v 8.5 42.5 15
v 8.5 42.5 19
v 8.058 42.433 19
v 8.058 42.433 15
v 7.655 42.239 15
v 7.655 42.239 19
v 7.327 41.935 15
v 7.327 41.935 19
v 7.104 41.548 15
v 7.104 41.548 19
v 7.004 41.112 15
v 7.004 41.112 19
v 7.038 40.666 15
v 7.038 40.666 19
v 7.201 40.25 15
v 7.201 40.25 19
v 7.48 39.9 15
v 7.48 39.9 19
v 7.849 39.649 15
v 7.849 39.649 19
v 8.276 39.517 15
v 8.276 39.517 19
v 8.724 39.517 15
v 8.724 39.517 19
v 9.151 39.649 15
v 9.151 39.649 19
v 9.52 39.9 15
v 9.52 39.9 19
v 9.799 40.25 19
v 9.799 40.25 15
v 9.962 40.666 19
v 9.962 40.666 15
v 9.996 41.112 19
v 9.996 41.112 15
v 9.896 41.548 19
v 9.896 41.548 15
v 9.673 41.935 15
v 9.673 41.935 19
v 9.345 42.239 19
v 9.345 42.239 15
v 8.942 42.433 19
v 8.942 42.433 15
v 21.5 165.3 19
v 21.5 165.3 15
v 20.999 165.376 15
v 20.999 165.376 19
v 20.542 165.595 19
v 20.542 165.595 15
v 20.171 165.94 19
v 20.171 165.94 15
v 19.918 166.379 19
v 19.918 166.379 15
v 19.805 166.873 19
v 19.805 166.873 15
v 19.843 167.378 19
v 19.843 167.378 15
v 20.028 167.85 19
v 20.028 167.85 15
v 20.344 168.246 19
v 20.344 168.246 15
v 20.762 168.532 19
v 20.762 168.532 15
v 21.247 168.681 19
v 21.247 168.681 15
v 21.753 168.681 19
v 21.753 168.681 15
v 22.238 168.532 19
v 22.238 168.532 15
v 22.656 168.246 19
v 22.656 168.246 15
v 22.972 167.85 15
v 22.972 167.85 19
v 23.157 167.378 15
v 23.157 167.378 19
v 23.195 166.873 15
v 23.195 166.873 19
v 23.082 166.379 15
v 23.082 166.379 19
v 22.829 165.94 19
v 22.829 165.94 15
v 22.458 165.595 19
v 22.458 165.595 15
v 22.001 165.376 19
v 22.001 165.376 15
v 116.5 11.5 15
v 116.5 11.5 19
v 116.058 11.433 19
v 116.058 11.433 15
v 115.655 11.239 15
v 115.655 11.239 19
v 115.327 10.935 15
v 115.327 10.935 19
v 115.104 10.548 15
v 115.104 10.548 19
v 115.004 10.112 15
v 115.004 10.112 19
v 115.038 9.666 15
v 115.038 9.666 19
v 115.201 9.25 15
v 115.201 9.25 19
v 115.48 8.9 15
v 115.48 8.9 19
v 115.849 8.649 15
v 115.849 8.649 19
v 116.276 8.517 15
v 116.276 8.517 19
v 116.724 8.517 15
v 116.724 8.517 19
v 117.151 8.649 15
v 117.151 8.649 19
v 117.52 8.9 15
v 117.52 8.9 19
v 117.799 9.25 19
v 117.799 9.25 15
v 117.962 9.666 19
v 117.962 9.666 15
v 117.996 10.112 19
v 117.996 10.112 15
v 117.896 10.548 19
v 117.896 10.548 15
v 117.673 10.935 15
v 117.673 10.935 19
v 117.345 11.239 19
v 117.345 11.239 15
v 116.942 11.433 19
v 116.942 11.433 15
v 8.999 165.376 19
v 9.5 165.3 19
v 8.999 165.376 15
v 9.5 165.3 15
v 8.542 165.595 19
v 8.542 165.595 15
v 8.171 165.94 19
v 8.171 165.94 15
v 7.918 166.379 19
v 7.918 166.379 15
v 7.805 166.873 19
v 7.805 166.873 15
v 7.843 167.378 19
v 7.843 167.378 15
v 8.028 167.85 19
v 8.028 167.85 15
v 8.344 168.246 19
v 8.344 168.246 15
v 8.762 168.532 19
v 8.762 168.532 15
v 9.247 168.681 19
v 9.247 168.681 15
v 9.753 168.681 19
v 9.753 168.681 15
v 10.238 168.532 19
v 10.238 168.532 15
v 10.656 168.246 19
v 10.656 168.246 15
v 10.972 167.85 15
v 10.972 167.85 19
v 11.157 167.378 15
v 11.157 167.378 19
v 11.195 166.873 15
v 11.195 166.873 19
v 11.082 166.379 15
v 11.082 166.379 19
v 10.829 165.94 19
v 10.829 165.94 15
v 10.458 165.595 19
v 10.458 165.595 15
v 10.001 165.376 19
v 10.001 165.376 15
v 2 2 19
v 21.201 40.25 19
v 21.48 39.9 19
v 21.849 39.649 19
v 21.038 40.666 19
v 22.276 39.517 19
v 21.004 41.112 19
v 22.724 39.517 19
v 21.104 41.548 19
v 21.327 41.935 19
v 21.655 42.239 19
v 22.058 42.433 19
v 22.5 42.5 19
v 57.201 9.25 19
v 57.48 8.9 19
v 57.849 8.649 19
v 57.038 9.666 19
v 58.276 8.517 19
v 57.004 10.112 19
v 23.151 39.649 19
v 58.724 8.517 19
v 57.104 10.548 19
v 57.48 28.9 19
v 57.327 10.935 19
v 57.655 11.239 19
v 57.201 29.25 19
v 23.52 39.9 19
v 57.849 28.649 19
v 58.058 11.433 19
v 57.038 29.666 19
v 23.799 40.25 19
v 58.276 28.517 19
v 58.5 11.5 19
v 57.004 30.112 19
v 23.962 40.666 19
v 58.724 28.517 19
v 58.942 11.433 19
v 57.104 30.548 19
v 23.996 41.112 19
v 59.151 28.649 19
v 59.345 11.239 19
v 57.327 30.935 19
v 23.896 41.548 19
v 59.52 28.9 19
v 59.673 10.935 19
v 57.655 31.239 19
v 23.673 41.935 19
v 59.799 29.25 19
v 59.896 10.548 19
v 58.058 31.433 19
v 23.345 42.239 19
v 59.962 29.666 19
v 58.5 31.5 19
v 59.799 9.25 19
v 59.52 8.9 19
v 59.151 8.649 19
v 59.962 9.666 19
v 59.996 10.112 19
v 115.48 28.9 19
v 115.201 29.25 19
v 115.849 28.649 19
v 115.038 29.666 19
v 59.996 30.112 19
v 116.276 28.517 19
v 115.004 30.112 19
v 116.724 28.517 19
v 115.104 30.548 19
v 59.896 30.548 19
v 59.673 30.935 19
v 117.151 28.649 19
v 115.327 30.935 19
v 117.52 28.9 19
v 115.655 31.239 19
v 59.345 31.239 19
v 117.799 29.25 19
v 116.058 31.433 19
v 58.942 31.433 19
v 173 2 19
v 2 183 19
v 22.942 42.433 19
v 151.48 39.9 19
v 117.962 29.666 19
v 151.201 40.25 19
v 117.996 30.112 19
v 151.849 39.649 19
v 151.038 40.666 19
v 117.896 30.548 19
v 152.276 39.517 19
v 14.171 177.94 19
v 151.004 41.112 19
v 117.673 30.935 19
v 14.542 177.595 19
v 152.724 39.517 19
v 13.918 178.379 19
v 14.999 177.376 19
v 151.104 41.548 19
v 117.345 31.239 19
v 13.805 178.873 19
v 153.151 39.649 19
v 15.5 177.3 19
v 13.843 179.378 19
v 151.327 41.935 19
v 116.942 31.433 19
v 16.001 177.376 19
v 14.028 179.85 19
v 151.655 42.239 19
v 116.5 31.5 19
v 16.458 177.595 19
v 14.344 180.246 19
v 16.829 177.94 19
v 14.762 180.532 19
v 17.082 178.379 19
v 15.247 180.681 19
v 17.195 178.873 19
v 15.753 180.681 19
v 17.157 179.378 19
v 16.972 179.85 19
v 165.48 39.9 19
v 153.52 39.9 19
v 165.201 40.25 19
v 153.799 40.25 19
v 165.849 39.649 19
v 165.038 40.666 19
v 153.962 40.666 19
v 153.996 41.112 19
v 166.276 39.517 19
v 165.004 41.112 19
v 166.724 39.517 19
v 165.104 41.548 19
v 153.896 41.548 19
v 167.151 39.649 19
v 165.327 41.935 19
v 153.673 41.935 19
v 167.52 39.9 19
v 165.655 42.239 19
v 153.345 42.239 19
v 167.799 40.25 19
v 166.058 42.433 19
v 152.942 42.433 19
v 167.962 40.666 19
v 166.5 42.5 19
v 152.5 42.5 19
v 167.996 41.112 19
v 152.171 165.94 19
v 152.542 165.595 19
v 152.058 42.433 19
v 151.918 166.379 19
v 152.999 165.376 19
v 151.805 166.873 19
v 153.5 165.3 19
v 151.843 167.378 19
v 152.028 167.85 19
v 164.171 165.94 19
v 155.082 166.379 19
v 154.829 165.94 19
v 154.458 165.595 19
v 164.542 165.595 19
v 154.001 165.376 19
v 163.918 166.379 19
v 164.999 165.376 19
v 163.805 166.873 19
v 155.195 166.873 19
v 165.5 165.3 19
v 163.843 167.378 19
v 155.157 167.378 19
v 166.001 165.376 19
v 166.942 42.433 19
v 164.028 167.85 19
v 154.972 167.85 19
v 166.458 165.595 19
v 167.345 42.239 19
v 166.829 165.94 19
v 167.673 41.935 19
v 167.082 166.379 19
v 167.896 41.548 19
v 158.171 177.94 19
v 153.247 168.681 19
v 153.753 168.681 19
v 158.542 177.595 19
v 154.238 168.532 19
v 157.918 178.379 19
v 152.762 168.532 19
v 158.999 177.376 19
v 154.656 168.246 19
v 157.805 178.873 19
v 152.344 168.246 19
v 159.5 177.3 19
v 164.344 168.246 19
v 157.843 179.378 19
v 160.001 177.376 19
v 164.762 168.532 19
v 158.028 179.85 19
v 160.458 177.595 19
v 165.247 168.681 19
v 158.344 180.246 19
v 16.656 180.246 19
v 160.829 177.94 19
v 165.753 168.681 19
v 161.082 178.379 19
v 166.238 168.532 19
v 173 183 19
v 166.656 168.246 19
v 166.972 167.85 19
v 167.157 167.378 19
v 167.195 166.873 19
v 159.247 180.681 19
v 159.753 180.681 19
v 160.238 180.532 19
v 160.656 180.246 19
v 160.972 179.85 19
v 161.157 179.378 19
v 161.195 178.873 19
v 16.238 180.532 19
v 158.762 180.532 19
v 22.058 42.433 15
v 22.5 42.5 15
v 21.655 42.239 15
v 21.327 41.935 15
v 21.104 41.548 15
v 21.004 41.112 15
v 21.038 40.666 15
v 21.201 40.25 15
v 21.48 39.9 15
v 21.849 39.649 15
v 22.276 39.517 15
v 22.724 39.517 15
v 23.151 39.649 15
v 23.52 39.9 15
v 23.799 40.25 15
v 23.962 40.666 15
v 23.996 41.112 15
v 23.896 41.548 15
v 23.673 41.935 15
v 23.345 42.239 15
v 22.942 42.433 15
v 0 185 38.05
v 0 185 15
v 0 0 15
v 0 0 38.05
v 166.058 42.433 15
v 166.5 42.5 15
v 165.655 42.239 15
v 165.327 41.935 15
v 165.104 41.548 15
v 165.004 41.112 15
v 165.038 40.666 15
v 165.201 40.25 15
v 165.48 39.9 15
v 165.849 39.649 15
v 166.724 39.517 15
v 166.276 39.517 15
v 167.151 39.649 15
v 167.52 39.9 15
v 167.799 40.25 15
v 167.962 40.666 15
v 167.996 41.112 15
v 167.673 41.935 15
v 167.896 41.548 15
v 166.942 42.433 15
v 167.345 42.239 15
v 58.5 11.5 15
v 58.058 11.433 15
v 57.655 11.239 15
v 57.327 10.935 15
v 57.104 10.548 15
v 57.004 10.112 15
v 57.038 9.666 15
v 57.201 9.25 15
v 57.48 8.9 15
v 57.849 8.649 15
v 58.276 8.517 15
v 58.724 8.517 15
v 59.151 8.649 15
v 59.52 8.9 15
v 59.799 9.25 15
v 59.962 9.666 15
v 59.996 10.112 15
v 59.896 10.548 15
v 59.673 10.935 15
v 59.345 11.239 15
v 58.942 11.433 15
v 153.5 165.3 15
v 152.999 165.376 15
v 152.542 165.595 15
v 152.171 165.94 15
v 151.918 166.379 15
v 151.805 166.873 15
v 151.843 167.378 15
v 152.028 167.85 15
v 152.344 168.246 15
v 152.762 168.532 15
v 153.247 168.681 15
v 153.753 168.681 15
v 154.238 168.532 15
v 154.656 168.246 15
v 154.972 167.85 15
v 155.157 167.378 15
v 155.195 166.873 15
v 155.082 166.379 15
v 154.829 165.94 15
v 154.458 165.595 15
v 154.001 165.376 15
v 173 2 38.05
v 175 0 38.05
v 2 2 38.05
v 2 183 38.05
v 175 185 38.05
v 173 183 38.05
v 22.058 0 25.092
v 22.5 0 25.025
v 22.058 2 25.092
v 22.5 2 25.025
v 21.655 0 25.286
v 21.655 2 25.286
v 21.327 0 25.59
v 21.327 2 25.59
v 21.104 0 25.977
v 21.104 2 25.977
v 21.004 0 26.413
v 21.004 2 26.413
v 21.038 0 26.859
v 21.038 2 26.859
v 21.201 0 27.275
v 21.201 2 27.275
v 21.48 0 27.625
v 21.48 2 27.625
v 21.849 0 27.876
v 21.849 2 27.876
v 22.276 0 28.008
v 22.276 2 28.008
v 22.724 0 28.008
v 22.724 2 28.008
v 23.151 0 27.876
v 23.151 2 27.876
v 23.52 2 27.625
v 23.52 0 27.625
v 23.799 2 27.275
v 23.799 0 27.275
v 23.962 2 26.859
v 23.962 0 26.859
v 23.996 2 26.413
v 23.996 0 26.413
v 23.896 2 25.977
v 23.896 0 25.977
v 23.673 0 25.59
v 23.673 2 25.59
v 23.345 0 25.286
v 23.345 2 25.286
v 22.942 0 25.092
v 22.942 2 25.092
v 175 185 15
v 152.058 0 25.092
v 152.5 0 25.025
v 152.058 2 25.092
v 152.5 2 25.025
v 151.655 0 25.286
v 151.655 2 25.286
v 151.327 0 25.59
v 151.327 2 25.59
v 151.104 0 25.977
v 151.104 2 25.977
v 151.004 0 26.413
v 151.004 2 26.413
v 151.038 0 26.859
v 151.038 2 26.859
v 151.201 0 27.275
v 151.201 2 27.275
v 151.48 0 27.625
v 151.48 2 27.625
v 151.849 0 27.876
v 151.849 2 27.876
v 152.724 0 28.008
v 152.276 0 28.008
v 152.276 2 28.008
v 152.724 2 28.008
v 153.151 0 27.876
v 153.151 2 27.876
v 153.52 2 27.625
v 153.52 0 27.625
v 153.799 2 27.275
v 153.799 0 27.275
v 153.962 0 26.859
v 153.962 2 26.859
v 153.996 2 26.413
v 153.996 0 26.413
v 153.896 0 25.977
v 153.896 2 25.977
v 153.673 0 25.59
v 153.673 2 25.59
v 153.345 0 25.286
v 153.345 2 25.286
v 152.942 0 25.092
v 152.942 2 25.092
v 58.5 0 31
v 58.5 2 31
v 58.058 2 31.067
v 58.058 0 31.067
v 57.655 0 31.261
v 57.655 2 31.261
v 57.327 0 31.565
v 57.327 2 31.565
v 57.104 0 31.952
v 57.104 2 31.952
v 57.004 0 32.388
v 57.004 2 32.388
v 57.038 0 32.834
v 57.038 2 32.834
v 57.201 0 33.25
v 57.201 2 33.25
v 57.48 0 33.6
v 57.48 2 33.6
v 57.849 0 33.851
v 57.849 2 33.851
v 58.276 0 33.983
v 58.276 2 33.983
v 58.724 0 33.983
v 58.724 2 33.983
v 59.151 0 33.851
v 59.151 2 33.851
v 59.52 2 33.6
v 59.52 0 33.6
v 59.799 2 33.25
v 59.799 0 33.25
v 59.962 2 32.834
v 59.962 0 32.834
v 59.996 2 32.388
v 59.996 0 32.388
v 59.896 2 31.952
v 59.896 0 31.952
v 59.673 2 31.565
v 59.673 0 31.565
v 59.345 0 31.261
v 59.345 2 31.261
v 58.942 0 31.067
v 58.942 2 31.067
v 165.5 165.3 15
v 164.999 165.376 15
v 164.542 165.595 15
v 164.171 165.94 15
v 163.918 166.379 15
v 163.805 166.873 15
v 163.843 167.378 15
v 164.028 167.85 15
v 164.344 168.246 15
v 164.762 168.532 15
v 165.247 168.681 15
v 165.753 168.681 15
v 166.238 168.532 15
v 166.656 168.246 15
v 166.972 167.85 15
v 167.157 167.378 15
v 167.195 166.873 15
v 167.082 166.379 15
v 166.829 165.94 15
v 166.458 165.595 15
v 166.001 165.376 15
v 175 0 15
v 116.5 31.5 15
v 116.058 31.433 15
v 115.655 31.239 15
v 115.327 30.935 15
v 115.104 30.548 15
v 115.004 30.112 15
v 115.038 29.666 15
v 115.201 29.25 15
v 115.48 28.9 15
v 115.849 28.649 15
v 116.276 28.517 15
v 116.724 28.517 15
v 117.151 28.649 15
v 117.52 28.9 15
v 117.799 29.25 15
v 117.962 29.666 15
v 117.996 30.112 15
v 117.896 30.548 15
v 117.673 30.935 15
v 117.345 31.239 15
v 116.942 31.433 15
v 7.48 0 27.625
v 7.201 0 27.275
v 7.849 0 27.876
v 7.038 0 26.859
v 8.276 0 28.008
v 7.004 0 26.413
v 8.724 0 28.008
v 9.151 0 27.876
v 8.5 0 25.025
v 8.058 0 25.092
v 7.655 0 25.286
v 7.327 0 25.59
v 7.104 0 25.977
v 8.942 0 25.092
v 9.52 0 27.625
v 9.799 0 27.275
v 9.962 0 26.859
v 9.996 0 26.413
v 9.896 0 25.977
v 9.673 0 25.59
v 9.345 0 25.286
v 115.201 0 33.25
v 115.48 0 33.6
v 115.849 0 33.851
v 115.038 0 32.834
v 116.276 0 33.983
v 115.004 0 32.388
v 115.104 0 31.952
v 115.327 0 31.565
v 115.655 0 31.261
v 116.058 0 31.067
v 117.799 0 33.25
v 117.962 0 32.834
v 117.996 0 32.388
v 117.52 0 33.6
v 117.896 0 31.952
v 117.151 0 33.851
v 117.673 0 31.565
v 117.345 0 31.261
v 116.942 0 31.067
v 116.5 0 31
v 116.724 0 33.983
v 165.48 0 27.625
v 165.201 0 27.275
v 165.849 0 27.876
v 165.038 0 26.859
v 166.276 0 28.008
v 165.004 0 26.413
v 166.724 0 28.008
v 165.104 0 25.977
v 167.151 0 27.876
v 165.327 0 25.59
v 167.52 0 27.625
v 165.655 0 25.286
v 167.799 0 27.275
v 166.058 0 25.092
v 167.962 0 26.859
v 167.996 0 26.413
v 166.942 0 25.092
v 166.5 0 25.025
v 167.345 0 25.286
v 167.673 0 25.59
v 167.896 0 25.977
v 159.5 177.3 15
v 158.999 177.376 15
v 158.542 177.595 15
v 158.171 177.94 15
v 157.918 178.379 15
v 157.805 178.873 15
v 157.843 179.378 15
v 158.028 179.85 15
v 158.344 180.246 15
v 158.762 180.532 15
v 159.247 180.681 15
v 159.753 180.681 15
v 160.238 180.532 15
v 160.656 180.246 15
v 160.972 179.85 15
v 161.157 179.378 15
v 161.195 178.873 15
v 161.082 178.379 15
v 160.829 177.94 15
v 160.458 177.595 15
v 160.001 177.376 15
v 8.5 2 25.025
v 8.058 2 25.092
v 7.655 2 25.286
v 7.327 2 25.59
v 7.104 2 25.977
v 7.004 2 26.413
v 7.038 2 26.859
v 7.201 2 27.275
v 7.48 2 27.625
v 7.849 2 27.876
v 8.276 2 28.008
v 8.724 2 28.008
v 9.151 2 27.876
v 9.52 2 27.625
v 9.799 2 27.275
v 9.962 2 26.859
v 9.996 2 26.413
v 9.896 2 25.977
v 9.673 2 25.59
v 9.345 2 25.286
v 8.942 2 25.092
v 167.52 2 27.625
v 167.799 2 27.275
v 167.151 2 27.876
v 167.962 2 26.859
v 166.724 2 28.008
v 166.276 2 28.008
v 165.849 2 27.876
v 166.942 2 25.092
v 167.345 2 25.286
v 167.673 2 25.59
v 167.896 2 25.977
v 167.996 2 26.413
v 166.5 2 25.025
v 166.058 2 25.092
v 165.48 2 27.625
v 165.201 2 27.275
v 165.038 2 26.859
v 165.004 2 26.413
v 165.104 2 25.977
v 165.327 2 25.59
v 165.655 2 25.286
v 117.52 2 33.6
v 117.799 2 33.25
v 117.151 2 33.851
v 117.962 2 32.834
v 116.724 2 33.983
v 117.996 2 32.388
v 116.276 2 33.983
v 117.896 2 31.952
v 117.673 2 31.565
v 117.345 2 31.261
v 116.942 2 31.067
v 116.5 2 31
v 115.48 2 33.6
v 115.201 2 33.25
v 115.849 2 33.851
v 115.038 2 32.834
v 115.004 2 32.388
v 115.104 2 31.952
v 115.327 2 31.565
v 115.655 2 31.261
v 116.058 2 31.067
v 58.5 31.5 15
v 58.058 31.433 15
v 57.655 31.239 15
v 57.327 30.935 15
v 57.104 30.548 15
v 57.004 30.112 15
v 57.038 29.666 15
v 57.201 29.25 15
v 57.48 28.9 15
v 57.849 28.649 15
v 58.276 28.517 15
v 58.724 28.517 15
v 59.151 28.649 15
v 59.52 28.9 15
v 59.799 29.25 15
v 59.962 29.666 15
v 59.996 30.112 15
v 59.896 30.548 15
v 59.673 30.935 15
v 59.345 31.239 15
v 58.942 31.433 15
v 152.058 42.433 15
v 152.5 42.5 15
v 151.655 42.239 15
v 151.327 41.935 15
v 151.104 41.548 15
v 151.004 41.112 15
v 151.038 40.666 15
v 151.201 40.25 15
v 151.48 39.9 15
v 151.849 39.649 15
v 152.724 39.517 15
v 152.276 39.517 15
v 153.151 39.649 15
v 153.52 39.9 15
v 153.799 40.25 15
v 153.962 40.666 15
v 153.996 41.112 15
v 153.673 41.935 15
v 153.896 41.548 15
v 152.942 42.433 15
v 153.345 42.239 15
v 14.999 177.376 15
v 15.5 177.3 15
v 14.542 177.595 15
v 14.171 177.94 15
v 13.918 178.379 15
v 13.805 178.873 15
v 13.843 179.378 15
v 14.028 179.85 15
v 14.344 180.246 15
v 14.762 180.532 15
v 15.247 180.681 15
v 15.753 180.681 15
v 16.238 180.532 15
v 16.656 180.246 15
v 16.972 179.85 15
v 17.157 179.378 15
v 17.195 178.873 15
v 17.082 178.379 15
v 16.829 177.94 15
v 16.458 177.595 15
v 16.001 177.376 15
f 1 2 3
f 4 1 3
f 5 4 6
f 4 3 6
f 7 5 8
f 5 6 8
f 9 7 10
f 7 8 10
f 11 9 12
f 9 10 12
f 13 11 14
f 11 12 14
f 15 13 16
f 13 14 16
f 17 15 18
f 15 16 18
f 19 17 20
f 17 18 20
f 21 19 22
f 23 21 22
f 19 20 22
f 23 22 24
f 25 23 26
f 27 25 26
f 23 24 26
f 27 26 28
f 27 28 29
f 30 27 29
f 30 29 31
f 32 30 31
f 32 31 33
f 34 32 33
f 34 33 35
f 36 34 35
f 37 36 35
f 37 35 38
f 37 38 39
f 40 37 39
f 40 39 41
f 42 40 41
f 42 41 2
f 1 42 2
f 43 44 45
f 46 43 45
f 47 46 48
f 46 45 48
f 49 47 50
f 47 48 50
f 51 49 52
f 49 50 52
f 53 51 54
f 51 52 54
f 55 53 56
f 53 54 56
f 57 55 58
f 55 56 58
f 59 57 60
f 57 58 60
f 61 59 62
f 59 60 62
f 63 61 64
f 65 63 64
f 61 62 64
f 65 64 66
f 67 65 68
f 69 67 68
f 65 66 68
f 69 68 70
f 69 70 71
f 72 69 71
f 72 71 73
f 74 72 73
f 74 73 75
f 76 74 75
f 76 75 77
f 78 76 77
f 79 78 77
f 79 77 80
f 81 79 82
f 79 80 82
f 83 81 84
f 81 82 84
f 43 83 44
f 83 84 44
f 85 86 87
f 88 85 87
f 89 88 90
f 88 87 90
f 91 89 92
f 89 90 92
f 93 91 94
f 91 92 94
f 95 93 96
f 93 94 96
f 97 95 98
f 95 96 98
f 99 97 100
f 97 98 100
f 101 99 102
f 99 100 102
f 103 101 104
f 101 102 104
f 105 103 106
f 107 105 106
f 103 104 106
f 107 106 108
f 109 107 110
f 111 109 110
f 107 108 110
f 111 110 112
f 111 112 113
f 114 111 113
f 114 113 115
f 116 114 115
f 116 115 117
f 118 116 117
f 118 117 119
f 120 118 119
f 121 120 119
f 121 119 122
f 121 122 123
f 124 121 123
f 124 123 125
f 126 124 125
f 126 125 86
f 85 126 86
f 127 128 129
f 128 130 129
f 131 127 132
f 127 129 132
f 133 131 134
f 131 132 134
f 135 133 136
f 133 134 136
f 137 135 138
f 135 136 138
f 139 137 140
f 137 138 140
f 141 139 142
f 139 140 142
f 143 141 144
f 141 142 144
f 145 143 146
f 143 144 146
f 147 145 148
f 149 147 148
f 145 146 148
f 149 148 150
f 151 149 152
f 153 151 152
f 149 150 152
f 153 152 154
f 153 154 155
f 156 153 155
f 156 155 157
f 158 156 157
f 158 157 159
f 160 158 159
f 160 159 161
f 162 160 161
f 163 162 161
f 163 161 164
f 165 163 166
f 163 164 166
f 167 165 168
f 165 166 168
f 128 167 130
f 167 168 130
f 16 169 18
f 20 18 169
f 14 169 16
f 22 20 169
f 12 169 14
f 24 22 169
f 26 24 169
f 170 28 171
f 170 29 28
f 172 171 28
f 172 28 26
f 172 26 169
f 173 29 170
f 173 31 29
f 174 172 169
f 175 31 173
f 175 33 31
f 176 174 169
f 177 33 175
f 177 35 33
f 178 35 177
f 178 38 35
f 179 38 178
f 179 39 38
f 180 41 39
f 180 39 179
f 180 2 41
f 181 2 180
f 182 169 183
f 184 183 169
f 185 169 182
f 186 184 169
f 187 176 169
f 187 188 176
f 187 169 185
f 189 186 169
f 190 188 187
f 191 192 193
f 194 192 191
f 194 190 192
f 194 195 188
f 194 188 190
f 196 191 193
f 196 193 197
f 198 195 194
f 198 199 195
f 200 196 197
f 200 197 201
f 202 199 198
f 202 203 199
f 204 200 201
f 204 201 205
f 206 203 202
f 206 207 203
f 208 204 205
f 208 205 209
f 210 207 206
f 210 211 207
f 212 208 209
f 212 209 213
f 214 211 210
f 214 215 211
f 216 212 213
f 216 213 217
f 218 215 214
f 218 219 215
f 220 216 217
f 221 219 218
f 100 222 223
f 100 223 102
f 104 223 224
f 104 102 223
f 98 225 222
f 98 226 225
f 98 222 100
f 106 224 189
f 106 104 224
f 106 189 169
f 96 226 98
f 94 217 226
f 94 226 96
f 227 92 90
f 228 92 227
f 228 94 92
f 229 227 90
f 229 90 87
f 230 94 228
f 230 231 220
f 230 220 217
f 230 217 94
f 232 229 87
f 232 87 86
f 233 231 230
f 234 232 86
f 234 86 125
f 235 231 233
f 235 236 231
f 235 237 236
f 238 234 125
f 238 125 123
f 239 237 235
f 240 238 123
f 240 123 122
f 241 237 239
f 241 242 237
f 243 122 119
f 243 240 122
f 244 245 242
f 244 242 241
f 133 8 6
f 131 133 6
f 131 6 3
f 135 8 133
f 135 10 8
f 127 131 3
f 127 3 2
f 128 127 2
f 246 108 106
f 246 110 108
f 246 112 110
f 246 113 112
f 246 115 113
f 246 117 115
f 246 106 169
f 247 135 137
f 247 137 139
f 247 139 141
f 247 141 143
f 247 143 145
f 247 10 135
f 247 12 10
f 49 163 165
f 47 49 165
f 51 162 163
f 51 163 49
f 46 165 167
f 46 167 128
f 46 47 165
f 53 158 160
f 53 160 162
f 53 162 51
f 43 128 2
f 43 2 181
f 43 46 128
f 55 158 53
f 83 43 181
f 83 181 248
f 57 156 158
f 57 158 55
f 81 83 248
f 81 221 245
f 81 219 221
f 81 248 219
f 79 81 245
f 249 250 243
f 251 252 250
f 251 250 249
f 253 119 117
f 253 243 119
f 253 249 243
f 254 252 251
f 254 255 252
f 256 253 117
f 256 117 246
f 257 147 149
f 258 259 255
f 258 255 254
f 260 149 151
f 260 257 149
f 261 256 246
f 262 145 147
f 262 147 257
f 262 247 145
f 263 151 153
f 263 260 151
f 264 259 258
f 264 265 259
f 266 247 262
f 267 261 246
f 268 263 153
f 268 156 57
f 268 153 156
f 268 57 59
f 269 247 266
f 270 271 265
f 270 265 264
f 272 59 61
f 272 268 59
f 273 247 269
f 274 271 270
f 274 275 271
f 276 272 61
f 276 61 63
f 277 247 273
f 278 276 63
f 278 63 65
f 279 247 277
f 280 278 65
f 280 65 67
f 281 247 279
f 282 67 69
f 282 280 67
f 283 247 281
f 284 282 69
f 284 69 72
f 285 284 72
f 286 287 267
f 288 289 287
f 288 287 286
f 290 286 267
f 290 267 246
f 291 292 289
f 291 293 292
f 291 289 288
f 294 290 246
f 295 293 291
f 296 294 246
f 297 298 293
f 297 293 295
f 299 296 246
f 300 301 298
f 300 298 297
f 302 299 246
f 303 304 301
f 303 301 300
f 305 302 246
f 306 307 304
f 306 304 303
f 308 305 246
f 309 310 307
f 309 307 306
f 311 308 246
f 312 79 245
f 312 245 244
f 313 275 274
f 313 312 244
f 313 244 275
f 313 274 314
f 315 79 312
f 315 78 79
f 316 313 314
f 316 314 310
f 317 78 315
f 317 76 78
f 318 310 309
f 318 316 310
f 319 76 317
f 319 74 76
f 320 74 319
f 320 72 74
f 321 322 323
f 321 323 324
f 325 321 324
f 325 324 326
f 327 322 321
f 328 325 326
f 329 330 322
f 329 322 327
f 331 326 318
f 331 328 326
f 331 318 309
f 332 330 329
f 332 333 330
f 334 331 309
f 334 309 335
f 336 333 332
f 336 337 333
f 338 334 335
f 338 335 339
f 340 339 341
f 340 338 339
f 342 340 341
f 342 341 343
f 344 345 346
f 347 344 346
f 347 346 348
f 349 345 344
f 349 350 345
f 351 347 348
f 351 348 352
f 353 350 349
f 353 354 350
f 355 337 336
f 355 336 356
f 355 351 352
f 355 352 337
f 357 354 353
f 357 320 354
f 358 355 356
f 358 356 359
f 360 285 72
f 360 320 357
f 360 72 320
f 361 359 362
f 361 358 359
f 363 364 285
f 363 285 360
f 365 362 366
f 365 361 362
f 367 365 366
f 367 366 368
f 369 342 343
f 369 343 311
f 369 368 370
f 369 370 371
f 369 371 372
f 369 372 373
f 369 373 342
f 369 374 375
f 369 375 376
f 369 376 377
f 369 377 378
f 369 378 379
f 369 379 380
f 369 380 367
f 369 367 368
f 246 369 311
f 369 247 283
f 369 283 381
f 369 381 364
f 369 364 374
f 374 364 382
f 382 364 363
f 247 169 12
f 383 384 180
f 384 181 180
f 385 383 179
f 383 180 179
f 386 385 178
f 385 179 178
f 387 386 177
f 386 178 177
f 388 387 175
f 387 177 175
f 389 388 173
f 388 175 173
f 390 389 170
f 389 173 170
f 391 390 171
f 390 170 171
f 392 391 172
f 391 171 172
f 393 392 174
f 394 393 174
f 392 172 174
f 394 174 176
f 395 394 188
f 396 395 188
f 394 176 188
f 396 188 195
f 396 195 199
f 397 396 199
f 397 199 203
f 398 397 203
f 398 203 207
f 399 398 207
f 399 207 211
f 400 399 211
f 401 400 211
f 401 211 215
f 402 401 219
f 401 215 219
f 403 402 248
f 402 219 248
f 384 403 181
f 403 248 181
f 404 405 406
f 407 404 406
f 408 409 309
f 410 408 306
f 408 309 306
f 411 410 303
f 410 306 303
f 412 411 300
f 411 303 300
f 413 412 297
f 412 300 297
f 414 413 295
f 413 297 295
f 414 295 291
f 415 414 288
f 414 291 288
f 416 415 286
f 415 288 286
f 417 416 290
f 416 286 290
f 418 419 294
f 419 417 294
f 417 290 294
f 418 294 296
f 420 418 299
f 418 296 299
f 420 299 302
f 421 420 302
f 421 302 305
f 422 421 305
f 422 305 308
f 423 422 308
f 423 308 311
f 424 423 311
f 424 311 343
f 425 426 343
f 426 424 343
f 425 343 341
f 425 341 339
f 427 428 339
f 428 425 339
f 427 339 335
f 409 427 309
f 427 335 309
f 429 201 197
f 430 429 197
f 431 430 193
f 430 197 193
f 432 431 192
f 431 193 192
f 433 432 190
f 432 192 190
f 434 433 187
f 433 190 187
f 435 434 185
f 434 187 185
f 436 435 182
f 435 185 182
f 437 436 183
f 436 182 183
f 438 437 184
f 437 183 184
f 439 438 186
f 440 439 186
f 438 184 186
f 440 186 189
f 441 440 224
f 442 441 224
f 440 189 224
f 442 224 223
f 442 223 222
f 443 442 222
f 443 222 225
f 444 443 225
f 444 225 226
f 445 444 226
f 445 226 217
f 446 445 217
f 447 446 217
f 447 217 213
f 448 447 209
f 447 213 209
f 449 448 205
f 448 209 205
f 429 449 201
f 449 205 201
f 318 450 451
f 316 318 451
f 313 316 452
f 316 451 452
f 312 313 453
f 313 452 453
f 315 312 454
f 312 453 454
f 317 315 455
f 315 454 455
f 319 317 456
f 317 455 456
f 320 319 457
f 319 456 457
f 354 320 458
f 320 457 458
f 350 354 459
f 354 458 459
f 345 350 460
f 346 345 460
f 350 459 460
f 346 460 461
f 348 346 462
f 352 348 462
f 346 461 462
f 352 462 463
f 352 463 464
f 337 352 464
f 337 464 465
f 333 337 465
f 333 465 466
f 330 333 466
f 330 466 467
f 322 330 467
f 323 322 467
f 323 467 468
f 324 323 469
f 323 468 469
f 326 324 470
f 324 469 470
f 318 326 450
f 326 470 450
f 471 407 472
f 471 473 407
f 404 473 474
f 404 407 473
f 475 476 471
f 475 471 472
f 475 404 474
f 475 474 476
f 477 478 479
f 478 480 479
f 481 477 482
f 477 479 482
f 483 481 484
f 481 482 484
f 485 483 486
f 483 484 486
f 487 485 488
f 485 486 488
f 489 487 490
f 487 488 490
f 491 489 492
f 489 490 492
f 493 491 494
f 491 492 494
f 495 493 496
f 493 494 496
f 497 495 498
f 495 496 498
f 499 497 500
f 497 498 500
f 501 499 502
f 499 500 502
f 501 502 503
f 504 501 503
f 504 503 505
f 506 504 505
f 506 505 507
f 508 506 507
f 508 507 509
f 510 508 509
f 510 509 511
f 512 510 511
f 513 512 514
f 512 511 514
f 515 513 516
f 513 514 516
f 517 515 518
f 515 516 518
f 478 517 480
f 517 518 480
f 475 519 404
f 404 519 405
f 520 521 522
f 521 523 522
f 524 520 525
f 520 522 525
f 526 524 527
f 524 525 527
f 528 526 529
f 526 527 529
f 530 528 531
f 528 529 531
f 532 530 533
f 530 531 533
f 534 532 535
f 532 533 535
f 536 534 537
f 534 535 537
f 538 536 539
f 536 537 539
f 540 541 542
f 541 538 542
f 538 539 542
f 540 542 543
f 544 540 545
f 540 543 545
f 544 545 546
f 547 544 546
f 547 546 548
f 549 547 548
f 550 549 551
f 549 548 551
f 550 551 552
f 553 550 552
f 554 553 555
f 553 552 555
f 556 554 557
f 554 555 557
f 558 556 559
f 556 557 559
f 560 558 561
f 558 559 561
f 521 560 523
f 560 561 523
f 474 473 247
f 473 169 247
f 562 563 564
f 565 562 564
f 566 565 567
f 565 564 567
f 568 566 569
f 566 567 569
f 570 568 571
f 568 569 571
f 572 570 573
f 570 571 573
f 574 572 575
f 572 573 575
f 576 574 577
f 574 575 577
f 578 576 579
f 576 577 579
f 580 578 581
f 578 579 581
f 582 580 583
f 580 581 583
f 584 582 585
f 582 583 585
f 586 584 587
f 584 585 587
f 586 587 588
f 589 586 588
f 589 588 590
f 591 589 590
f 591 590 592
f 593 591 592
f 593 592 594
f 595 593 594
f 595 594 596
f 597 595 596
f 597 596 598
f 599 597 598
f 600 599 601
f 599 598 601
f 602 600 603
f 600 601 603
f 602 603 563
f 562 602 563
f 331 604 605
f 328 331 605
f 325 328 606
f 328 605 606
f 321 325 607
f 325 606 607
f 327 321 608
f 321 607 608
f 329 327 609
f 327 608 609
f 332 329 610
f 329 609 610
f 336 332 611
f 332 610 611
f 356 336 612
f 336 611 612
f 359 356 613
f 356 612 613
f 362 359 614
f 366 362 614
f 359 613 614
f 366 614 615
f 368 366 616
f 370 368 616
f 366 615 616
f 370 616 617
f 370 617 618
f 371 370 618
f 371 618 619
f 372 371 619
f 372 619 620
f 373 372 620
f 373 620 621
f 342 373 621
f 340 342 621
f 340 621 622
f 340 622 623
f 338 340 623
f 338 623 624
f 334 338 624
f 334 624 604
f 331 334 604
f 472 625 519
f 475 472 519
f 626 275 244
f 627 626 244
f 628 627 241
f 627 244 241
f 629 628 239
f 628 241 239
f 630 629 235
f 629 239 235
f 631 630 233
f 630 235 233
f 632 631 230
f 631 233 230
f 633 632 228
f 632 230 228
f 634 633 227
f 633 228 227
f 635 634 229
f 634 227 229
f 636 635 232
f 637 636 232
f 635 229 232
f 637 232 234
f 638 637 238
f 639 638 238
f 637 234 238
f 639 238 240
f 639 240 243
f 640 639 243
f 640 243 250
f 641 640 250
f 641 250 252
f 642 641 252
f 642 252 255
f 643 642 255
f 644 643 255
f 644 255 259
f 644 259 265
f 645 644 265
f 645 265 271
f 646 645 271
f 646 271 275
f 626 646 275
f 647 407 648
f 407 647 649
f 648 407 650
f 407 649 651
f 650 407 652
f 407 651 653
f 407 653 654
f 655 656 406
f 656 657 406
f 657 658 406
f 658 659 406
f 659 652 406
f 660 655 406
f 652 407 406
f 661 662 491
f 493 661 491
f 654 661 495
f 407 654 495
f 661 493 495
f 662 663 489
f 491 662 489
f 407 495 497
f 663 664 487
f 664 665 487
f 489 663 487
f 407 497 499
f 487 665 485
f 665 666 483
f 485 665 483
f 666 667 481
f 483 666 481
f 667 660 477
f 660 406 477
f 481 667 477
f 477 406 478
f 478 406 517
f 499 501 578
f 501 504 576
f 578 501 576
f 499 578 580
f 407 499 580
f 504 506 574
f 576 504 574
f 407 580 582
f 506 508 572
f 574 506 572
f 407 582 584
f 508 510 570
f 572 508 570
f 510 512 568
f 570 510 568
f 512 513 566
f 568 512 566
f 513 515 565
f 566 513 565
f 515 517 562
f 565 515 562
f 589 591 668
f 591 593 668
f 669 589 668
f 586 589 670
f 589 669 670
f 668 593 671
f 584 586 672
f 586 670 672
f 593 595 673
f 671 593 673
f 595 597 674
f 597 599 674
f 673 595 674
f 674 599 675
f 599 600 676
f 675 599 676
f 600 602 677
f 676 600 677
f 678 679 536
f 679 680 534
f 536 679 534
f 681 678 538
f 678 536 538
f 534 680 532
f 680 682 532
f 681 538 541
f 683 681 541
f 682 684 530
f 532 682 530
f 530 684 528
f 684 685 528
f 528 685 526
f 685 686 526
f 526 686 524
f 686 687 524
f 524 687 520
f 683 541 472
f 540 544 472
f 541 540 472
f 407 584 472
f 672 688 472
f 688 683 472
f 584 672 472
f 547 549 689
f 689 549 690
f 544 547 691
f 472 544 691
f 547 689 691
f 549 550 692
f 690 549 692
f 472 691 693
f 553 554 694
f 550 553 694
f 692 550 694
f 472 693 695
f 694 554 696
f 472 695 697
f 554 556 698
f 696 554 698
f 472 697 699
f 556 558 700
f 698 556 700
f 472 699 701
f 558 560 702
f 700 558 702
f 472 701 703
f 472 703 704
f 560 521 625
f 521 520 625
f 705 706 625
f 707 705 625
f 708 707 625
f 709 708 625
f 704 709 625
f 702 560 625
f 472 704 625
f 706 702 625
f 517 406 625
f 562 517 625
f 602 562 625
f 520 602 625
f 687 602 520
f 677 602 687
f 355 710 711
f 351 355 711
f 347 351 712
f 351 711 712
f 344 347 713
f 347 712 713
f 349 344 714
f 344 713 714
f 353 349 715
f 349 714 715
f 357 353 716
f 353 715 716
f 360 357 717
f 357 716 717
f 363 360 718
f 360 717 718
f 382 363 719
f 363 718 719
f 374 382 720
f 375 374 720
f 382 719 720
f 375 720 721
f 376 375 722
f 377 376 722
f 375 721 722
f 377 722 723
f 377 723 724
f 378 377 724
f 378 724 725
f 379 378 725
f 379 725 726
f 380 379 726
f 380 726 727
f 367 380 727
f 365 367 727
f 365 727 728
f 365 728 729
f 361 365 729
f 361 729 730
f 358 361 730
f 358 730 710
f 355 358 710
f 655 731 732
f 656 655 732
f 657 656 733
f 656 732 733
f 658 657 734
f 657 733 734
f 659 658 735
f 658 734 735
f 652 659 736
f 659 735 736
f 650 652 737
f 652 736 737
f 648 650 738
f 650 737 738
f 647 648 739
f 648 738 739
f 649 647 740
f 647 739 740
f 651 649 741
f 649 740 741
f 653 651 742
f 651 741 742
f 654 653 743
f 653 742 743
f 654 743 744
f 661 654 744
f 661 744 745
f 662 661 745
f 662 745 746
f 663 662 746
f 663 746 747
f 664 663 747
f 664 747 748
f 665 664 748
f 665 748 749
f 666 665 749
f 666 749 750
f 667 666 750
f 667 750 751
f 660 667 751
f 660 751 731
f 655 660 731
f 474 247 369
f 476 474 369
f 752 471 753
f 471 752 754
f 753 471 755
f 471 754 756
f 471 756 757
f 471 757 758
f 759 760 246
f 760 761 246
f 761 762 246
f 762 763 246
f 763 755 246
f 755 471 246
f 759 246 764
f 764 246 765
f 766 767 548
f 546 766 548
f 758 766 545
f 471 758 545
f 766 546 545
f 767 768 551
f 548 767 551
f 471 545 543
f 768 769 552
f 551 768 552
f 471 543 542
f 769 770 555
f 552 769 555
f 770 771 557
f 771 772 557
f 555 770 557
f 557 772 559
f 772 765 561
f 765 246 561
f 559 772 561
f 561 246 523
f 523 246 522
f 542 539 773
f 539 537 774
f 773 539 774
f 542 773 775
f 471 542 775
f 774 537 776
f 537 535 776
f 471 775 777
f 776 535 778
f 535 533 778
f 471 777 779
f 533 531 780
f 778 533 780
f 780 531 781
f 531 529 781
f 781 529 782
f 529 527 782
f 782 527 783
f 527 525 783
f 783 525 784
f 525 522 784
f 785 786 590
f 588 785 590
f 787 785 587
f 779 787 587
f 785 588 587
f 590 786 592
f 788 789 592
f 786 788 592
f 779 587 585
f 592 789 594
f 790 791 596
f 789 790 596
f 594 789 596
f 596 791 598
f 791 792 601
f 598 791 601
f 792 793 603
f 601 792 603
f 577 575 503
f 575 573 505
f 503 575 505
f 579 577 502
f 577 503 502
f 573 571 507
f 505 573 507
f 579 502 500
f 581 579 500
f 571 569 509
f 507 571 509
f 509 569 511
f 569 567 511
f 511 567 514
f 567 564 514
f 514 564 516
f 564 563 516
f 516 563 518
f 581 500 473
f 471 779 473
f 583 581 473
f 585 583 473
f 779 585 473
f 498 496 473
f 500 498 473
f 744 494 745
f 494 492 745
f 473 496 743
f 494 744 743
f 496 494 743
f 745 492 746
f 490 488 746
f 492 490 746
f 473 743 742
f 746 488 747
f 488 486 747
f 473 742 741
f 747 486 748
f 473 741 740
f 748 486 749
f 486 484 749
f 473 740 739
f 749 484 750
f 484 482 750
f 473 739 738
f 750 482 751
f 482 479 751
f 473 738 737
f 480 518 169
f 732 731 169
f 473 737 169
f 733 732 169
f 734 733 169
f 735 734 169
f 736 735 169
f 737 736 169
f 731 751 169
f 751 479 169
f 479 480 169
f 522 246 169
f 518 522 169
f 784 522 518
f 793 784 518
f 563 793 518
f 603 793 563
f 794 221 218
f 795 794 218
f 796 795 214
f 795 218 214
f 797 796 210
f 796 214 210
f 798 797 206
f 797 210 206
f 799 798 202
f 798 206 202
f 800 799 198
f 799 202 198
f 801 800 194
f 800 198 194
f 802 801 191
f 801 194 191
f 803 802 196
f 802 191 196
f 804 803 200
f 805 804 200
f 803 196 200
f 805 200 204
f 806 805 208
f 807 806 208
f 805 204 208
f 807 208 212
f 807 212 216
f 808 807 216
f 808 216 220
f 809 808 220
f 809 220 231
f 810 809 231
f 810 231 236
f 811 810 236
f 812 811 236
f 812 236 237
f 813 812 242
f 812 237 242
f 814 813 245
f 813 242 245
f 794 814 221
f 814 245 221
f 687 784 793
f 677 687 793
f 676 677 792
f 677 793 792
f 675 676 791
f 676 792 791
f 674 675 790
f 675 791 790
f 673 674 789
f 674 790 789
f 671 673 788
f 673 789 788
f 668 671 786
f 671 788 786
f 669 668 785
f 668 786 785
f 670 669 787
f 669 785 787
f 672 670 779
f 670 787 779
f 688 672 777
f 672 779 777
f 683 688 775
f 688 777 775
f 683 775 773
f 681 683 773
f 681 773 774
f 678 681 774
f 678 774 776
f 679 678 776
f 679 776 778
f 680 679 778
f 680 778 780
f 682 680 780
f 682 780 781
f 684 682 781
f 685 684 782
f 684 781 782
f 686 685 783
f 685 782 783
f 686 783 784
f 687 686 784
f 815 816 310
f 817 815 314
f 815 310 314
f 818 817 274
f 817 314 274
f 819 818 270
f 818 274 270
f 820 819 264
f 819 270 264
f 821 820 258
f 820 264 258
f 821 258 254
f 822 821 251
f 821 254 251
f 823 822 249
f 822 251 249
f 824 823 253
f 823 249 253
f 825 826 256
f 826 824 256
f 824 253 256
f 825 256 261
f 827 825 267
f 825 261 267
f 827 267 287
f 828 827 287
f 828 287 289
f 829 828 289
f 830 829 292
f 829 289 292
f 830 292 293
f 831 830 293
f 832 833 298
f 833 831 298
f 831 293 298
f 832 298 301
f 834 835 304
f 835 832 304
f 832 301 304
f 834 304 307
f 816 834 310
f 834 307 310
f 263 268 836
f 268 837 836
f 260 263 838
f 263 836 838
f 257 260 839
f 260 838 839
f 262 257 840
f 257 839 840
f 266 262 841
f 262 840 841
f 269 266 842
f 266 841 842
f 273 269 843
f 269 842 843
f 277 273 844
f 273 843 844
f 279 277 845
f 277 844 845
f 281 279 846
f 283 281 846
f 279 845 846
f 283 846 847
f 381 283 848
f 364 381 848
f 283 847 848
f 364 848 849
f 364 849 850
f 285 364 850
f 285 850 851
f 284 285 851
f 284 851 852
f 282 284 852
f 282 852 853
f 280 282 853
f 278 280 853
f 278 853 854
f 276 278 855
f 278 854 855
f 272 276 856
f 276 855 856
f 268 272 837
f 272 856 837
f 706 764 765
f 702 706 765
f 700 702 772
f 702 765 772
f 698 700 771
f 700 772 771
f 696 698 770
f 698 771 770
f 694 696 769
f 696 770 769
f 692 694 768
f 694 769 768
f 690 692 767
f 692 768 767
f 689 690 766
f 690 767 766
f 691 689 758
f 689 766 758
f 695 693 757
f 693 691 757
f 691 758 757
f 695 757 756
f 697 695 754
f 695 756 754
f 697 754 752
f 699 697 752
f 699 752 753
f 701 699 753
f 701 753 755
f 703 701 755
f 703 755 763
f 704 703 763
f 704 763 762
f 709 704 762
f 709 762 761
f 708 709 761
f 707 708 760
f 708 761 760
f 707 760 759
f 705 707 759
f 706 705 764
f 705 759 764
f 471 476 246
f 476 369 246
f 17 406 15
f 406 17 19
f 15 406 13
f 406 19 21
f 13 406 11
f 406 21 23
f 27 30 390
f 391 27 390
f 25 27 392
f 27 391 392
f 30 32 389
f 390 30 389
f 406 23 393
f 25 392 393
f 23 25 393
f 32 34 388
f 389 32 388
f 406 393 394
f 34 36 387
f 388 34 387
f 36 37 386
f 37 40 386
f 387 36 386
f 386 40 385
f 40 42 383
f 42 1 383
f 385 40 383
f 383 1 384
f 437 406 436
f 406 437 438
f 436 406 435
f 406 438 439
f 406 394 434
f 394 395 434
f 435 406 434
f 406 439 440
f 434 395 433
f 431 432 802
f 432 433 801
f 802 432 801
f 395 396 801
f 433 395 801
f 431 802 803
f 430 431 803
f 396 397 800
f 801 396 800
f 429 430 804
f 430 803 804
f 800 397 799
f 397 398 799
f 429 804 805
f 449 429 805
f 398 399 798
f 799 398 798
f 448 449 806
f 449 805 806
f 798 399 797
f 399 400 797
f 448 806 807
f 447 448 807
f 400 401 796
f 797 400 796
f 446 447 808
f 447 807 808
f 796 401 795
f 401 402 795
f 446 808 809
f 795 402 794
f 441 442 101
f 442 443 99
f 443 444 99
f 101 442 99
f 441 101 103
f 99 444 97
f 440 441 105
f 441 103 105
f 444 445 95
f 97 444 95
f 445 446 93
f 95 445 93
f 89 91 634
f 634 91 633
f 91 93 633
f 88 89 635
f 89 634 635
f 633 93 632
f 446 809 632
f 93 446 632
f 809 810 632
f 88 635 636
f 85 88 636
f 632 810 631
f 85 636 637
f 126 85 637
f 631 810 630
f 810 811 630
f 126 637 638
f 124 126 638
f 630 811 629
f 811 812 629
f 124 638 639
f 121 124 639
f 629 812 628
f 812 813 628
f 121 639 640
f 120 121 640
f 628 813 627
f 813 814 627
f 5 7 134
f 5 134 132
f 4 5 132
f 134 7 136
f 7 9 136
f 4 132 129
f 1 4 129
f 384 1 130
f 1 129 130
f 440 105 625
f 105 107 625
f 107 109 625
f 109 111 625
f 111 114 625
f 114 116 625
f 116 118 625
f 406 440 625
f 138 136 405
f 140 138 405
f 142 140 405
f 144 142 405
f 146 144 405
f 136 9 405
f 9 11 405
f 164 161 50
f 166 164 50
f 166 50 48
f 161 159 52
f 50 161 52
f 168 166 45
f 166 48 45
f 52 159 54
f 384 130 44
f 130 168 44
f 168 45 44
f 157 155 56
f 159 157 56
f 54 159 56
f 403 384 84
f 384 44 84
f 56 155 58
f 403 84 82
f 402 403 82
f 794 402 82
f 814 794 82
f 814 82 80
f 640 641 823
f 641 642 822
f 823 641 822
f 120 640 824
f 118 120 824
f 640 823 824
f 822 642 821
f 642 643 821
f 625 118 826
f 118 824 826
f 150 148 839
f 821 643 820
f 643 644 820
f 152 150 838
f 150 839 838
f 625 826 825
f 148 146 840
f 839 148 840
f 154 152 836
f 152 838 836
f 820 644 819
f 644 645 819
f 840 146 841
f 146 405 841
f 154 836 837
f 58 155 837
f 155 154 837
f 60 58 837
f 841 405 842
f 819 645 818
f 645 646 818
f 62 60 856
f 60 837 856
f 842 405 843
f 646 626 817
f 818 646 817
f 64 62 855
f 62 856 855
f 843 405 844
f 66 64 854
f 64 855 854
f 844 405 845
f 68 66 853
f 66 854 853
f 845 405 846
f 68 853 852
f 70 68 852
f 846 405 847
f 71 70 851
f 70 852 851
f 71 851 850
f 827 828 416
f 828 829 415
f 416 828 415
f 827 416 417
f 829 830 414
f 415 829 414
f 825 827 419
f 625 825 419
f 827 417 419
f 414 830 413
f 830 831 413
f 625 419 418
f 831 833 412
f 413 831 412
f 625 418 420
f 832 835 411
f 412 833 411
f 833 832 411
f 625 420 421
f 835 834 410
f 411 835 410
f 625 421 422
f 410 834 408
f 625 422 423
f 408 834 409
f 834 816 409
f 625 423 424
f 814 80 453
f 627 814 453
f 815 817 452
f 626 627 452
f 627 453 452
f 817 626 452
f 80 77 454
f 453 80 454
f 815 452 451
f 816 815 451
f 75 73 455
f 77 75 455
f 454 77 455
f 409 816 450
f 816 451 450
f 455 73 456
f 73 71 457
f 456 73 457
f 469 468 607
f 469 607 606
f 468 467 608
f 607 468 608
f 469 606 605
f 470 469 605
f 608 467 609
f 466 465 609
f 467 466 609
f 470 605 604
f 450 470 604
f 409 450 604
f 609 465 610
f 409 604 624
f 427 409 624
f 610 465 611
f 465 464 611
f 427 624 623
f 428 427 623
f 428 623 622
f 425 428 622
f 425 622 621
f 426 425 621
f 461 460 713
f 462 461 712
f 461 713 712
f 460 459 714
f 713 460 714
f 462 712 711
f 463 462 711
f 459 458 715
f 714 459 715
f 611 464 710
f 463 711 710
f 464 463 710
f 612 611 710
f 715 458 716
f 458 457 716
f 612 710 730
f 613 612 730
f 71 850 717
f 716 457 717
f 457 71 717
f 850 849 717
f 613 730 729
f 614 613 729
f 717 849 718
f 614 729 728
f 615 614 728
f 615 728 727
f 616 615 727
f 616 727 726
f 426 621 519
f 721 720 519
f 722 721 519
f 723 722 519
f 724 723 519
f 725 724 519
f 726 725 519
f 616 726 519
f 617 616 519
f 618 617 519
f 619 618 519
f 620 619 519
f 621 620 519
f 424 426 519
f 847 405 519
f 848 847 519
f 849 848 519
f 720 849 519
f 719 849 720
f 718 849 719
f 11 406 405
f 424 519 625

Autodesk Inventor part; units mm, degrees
ref_plane "YZ Plane" through (0, 0, 0) normal (1, 0, 0) x (0, 1, 0)
ref_plane "Work Plane1" through (0, 0, 15) normal (0, 0, 1) x (1, 0, 0)
sketch "Sketch1" plane through (0, 0, 15) normal (0, 0, 1) x (1, 0, 0)
  line L0 (0, 0) -> (175, 0)
  line L1 (175, 0) -> (175, 185)
  line L2 (175, 185) -> (0, 185)
  line L3 (0, 185) -> (0, 0)
  dimension "d7" = 175
  dimension "d8" = 185
extrude "Extrusion1" add sketch "Sketch1" along normal blind 4
sketch "Sketch2" plane through (0, 0, 19) normal (0, 0, 1) x (1, 0, 0)
  line L0 (175, 185) -> (0, 185) projected
  line L1 (175, 0) -> (175, 185) projected
  line L2 (0, 185) -> (0, 0) projected
  point P0 (15.5, 179)
  point P1 (9.5, 167)
  point P2 (21.5, 167)
  point P3 (159.5, 179)
  point P4 (153.5, 167)
  point P5 (165.5, 167)
  dimension "d9" = 12
  dimension "d10" = 6
  dimension "d11" = 6
  dimension "d12" = 12
  dimension "d13" = 6
  dimension "d14" = 12
  dimension "d15" = 6
  dimension "d16" = 12
  dimension "d17" = 6
  dimension "d18" = 6
  dimension "d19" = 144
  dimension "d20" = 9.5
  dimension "d21" = 9.5
hole "Hole1" at (15.5, 179, 19) at (9.5, 167, 19) at (21.5, 167, 19) at (159.5, 179, 19) at (153.5, 167, 19) at (165.5, 167, 19) direction (0, 0, -1) diameter 3.4 end through all clearance for "Socket Head Cap Screw" size "M3" standard "Ansi Metric M Profile"
sketch "Sketch3" plane through (0, 0, 19) normal (0, 0, 1) x (1, 0, 0)
  circle A0 centre (153.5, 167) radius 1.7 projected
  circle A1 centre (21.5, 167) radius 1.7 projected
  circle A2 centre (15.5, 179) radius 1.7 projected
  circle A3 centre (9.5, 167) radius 1.7 projected
  circle A4 centre (159.5, 179) radius 1.7 projected
  circle A5 centre (165.5, 167) radius 1.7 projected
  line L0 (175, 0) -> (175, 185) projected
  line L1 (175, 185) -> (0, 185) projected
  line L2 (0, 185) -> (0, 0) projected
  line L3 (0, 0) -> (175, 0) projected
  line L4 (2, 183) -> (173, 183)
  line L5 (173, 183) -> (173, 2)
  line L6 (173, 2) -> (2, 2)
  line L7 (2, 2) -> (2, 183)
  dimension "d34" = 2
extrude "Extrusion2" add sketch "Sketch3" along normal blind 19.05 contours L3 L2 L1 L0
sketch "Sketch5" plane through (0, 0, 15) normal (0, 0, -1) x (-1, 0, 0)
  line L0 (0, 0) -> (-175, 0) projected
  line L1 (0, 185) -> (0, 0) projected
  point P0 (-8.5, 41)
  point P1 (-22.5, 41)
  dimension "d38" = 14
  dimension "d39" = 8.5
  dimension "d40" = 41
sketch "Sketch6" plane through (0, 0, 15) normal (0, -1, 0) x (1, 0, 0)
  line L0 (0, 0) -> (0, 23.05) projected
  point P0 (0, -15)
  point P1 (8.5, 11.525)
  point P2 (22.5, 11.525)
  point P3 (0, 11.525)
  dimension "d41" = 8.5
  dimension "d42" = 14
hole "Hole2" at (8.5, 41, 15) at (22.5, 41, 15) direction (0, 0, 1) diameter 3 end through all
hole "Hole3" at (8.5, 0, 26.525) at (22.5, 0, 26.525) direction (0, 1, 0) diameter 3 depth 2
ref_plane "Work Plane2" through (87.5, 0, 15) normal (-1, 0, 0) x (0, 0, 1)
mirror "Mirror1" about plane through (87.5, 0, 15) normal (-1, 0, 0) of "Hole2", "Hole3"
sketch "Sketch7" plane through (0, 0, 15) normal (0, -1, 0) x (1, 0, 0)
  line L0 (58.5, 17.5) -> (116.5, 17.5) construction
  line L1 (0, 23.05) -> (175, 23.05) construction
  point P0 (0, -15)
  point P1 (87.5, 17.5)
  point P2 (87.5, 23.05)
  dimension "d57" = 58
  dimension "d58" = 5.55
hole "Hole4" at (58.5, 0, 32.5) at (116.5, 0, 32.5) direction (0, 1, 0) diameter 3 depth 2
sketch "Sketch8" plane through (0, 0, 15) normal (0, 0, -1) x (-1, 0, 0)
  line L0 (0, 0) -> (-175, 0) projected
  line L1 (-58.5, 10) -> (-116.5, 10) construction
  point P0 (-58.5, 30)
  point P1 (-116.5, 30)
  point P2 (-87.5, 10)
  point P3 (-87.5, 0)
  dimension "d66" = 58
  dimension "d67" = 10
  dimension "d68" = 20
hole "Hole5" at (58.5, 10, 15) at (58.5, 30, 15) at (116.5, 10, 15) at (116.5, 30, 15) direction (0, 0, 1) diameter 3 depth 8
equation "\"d20\" = d21"
